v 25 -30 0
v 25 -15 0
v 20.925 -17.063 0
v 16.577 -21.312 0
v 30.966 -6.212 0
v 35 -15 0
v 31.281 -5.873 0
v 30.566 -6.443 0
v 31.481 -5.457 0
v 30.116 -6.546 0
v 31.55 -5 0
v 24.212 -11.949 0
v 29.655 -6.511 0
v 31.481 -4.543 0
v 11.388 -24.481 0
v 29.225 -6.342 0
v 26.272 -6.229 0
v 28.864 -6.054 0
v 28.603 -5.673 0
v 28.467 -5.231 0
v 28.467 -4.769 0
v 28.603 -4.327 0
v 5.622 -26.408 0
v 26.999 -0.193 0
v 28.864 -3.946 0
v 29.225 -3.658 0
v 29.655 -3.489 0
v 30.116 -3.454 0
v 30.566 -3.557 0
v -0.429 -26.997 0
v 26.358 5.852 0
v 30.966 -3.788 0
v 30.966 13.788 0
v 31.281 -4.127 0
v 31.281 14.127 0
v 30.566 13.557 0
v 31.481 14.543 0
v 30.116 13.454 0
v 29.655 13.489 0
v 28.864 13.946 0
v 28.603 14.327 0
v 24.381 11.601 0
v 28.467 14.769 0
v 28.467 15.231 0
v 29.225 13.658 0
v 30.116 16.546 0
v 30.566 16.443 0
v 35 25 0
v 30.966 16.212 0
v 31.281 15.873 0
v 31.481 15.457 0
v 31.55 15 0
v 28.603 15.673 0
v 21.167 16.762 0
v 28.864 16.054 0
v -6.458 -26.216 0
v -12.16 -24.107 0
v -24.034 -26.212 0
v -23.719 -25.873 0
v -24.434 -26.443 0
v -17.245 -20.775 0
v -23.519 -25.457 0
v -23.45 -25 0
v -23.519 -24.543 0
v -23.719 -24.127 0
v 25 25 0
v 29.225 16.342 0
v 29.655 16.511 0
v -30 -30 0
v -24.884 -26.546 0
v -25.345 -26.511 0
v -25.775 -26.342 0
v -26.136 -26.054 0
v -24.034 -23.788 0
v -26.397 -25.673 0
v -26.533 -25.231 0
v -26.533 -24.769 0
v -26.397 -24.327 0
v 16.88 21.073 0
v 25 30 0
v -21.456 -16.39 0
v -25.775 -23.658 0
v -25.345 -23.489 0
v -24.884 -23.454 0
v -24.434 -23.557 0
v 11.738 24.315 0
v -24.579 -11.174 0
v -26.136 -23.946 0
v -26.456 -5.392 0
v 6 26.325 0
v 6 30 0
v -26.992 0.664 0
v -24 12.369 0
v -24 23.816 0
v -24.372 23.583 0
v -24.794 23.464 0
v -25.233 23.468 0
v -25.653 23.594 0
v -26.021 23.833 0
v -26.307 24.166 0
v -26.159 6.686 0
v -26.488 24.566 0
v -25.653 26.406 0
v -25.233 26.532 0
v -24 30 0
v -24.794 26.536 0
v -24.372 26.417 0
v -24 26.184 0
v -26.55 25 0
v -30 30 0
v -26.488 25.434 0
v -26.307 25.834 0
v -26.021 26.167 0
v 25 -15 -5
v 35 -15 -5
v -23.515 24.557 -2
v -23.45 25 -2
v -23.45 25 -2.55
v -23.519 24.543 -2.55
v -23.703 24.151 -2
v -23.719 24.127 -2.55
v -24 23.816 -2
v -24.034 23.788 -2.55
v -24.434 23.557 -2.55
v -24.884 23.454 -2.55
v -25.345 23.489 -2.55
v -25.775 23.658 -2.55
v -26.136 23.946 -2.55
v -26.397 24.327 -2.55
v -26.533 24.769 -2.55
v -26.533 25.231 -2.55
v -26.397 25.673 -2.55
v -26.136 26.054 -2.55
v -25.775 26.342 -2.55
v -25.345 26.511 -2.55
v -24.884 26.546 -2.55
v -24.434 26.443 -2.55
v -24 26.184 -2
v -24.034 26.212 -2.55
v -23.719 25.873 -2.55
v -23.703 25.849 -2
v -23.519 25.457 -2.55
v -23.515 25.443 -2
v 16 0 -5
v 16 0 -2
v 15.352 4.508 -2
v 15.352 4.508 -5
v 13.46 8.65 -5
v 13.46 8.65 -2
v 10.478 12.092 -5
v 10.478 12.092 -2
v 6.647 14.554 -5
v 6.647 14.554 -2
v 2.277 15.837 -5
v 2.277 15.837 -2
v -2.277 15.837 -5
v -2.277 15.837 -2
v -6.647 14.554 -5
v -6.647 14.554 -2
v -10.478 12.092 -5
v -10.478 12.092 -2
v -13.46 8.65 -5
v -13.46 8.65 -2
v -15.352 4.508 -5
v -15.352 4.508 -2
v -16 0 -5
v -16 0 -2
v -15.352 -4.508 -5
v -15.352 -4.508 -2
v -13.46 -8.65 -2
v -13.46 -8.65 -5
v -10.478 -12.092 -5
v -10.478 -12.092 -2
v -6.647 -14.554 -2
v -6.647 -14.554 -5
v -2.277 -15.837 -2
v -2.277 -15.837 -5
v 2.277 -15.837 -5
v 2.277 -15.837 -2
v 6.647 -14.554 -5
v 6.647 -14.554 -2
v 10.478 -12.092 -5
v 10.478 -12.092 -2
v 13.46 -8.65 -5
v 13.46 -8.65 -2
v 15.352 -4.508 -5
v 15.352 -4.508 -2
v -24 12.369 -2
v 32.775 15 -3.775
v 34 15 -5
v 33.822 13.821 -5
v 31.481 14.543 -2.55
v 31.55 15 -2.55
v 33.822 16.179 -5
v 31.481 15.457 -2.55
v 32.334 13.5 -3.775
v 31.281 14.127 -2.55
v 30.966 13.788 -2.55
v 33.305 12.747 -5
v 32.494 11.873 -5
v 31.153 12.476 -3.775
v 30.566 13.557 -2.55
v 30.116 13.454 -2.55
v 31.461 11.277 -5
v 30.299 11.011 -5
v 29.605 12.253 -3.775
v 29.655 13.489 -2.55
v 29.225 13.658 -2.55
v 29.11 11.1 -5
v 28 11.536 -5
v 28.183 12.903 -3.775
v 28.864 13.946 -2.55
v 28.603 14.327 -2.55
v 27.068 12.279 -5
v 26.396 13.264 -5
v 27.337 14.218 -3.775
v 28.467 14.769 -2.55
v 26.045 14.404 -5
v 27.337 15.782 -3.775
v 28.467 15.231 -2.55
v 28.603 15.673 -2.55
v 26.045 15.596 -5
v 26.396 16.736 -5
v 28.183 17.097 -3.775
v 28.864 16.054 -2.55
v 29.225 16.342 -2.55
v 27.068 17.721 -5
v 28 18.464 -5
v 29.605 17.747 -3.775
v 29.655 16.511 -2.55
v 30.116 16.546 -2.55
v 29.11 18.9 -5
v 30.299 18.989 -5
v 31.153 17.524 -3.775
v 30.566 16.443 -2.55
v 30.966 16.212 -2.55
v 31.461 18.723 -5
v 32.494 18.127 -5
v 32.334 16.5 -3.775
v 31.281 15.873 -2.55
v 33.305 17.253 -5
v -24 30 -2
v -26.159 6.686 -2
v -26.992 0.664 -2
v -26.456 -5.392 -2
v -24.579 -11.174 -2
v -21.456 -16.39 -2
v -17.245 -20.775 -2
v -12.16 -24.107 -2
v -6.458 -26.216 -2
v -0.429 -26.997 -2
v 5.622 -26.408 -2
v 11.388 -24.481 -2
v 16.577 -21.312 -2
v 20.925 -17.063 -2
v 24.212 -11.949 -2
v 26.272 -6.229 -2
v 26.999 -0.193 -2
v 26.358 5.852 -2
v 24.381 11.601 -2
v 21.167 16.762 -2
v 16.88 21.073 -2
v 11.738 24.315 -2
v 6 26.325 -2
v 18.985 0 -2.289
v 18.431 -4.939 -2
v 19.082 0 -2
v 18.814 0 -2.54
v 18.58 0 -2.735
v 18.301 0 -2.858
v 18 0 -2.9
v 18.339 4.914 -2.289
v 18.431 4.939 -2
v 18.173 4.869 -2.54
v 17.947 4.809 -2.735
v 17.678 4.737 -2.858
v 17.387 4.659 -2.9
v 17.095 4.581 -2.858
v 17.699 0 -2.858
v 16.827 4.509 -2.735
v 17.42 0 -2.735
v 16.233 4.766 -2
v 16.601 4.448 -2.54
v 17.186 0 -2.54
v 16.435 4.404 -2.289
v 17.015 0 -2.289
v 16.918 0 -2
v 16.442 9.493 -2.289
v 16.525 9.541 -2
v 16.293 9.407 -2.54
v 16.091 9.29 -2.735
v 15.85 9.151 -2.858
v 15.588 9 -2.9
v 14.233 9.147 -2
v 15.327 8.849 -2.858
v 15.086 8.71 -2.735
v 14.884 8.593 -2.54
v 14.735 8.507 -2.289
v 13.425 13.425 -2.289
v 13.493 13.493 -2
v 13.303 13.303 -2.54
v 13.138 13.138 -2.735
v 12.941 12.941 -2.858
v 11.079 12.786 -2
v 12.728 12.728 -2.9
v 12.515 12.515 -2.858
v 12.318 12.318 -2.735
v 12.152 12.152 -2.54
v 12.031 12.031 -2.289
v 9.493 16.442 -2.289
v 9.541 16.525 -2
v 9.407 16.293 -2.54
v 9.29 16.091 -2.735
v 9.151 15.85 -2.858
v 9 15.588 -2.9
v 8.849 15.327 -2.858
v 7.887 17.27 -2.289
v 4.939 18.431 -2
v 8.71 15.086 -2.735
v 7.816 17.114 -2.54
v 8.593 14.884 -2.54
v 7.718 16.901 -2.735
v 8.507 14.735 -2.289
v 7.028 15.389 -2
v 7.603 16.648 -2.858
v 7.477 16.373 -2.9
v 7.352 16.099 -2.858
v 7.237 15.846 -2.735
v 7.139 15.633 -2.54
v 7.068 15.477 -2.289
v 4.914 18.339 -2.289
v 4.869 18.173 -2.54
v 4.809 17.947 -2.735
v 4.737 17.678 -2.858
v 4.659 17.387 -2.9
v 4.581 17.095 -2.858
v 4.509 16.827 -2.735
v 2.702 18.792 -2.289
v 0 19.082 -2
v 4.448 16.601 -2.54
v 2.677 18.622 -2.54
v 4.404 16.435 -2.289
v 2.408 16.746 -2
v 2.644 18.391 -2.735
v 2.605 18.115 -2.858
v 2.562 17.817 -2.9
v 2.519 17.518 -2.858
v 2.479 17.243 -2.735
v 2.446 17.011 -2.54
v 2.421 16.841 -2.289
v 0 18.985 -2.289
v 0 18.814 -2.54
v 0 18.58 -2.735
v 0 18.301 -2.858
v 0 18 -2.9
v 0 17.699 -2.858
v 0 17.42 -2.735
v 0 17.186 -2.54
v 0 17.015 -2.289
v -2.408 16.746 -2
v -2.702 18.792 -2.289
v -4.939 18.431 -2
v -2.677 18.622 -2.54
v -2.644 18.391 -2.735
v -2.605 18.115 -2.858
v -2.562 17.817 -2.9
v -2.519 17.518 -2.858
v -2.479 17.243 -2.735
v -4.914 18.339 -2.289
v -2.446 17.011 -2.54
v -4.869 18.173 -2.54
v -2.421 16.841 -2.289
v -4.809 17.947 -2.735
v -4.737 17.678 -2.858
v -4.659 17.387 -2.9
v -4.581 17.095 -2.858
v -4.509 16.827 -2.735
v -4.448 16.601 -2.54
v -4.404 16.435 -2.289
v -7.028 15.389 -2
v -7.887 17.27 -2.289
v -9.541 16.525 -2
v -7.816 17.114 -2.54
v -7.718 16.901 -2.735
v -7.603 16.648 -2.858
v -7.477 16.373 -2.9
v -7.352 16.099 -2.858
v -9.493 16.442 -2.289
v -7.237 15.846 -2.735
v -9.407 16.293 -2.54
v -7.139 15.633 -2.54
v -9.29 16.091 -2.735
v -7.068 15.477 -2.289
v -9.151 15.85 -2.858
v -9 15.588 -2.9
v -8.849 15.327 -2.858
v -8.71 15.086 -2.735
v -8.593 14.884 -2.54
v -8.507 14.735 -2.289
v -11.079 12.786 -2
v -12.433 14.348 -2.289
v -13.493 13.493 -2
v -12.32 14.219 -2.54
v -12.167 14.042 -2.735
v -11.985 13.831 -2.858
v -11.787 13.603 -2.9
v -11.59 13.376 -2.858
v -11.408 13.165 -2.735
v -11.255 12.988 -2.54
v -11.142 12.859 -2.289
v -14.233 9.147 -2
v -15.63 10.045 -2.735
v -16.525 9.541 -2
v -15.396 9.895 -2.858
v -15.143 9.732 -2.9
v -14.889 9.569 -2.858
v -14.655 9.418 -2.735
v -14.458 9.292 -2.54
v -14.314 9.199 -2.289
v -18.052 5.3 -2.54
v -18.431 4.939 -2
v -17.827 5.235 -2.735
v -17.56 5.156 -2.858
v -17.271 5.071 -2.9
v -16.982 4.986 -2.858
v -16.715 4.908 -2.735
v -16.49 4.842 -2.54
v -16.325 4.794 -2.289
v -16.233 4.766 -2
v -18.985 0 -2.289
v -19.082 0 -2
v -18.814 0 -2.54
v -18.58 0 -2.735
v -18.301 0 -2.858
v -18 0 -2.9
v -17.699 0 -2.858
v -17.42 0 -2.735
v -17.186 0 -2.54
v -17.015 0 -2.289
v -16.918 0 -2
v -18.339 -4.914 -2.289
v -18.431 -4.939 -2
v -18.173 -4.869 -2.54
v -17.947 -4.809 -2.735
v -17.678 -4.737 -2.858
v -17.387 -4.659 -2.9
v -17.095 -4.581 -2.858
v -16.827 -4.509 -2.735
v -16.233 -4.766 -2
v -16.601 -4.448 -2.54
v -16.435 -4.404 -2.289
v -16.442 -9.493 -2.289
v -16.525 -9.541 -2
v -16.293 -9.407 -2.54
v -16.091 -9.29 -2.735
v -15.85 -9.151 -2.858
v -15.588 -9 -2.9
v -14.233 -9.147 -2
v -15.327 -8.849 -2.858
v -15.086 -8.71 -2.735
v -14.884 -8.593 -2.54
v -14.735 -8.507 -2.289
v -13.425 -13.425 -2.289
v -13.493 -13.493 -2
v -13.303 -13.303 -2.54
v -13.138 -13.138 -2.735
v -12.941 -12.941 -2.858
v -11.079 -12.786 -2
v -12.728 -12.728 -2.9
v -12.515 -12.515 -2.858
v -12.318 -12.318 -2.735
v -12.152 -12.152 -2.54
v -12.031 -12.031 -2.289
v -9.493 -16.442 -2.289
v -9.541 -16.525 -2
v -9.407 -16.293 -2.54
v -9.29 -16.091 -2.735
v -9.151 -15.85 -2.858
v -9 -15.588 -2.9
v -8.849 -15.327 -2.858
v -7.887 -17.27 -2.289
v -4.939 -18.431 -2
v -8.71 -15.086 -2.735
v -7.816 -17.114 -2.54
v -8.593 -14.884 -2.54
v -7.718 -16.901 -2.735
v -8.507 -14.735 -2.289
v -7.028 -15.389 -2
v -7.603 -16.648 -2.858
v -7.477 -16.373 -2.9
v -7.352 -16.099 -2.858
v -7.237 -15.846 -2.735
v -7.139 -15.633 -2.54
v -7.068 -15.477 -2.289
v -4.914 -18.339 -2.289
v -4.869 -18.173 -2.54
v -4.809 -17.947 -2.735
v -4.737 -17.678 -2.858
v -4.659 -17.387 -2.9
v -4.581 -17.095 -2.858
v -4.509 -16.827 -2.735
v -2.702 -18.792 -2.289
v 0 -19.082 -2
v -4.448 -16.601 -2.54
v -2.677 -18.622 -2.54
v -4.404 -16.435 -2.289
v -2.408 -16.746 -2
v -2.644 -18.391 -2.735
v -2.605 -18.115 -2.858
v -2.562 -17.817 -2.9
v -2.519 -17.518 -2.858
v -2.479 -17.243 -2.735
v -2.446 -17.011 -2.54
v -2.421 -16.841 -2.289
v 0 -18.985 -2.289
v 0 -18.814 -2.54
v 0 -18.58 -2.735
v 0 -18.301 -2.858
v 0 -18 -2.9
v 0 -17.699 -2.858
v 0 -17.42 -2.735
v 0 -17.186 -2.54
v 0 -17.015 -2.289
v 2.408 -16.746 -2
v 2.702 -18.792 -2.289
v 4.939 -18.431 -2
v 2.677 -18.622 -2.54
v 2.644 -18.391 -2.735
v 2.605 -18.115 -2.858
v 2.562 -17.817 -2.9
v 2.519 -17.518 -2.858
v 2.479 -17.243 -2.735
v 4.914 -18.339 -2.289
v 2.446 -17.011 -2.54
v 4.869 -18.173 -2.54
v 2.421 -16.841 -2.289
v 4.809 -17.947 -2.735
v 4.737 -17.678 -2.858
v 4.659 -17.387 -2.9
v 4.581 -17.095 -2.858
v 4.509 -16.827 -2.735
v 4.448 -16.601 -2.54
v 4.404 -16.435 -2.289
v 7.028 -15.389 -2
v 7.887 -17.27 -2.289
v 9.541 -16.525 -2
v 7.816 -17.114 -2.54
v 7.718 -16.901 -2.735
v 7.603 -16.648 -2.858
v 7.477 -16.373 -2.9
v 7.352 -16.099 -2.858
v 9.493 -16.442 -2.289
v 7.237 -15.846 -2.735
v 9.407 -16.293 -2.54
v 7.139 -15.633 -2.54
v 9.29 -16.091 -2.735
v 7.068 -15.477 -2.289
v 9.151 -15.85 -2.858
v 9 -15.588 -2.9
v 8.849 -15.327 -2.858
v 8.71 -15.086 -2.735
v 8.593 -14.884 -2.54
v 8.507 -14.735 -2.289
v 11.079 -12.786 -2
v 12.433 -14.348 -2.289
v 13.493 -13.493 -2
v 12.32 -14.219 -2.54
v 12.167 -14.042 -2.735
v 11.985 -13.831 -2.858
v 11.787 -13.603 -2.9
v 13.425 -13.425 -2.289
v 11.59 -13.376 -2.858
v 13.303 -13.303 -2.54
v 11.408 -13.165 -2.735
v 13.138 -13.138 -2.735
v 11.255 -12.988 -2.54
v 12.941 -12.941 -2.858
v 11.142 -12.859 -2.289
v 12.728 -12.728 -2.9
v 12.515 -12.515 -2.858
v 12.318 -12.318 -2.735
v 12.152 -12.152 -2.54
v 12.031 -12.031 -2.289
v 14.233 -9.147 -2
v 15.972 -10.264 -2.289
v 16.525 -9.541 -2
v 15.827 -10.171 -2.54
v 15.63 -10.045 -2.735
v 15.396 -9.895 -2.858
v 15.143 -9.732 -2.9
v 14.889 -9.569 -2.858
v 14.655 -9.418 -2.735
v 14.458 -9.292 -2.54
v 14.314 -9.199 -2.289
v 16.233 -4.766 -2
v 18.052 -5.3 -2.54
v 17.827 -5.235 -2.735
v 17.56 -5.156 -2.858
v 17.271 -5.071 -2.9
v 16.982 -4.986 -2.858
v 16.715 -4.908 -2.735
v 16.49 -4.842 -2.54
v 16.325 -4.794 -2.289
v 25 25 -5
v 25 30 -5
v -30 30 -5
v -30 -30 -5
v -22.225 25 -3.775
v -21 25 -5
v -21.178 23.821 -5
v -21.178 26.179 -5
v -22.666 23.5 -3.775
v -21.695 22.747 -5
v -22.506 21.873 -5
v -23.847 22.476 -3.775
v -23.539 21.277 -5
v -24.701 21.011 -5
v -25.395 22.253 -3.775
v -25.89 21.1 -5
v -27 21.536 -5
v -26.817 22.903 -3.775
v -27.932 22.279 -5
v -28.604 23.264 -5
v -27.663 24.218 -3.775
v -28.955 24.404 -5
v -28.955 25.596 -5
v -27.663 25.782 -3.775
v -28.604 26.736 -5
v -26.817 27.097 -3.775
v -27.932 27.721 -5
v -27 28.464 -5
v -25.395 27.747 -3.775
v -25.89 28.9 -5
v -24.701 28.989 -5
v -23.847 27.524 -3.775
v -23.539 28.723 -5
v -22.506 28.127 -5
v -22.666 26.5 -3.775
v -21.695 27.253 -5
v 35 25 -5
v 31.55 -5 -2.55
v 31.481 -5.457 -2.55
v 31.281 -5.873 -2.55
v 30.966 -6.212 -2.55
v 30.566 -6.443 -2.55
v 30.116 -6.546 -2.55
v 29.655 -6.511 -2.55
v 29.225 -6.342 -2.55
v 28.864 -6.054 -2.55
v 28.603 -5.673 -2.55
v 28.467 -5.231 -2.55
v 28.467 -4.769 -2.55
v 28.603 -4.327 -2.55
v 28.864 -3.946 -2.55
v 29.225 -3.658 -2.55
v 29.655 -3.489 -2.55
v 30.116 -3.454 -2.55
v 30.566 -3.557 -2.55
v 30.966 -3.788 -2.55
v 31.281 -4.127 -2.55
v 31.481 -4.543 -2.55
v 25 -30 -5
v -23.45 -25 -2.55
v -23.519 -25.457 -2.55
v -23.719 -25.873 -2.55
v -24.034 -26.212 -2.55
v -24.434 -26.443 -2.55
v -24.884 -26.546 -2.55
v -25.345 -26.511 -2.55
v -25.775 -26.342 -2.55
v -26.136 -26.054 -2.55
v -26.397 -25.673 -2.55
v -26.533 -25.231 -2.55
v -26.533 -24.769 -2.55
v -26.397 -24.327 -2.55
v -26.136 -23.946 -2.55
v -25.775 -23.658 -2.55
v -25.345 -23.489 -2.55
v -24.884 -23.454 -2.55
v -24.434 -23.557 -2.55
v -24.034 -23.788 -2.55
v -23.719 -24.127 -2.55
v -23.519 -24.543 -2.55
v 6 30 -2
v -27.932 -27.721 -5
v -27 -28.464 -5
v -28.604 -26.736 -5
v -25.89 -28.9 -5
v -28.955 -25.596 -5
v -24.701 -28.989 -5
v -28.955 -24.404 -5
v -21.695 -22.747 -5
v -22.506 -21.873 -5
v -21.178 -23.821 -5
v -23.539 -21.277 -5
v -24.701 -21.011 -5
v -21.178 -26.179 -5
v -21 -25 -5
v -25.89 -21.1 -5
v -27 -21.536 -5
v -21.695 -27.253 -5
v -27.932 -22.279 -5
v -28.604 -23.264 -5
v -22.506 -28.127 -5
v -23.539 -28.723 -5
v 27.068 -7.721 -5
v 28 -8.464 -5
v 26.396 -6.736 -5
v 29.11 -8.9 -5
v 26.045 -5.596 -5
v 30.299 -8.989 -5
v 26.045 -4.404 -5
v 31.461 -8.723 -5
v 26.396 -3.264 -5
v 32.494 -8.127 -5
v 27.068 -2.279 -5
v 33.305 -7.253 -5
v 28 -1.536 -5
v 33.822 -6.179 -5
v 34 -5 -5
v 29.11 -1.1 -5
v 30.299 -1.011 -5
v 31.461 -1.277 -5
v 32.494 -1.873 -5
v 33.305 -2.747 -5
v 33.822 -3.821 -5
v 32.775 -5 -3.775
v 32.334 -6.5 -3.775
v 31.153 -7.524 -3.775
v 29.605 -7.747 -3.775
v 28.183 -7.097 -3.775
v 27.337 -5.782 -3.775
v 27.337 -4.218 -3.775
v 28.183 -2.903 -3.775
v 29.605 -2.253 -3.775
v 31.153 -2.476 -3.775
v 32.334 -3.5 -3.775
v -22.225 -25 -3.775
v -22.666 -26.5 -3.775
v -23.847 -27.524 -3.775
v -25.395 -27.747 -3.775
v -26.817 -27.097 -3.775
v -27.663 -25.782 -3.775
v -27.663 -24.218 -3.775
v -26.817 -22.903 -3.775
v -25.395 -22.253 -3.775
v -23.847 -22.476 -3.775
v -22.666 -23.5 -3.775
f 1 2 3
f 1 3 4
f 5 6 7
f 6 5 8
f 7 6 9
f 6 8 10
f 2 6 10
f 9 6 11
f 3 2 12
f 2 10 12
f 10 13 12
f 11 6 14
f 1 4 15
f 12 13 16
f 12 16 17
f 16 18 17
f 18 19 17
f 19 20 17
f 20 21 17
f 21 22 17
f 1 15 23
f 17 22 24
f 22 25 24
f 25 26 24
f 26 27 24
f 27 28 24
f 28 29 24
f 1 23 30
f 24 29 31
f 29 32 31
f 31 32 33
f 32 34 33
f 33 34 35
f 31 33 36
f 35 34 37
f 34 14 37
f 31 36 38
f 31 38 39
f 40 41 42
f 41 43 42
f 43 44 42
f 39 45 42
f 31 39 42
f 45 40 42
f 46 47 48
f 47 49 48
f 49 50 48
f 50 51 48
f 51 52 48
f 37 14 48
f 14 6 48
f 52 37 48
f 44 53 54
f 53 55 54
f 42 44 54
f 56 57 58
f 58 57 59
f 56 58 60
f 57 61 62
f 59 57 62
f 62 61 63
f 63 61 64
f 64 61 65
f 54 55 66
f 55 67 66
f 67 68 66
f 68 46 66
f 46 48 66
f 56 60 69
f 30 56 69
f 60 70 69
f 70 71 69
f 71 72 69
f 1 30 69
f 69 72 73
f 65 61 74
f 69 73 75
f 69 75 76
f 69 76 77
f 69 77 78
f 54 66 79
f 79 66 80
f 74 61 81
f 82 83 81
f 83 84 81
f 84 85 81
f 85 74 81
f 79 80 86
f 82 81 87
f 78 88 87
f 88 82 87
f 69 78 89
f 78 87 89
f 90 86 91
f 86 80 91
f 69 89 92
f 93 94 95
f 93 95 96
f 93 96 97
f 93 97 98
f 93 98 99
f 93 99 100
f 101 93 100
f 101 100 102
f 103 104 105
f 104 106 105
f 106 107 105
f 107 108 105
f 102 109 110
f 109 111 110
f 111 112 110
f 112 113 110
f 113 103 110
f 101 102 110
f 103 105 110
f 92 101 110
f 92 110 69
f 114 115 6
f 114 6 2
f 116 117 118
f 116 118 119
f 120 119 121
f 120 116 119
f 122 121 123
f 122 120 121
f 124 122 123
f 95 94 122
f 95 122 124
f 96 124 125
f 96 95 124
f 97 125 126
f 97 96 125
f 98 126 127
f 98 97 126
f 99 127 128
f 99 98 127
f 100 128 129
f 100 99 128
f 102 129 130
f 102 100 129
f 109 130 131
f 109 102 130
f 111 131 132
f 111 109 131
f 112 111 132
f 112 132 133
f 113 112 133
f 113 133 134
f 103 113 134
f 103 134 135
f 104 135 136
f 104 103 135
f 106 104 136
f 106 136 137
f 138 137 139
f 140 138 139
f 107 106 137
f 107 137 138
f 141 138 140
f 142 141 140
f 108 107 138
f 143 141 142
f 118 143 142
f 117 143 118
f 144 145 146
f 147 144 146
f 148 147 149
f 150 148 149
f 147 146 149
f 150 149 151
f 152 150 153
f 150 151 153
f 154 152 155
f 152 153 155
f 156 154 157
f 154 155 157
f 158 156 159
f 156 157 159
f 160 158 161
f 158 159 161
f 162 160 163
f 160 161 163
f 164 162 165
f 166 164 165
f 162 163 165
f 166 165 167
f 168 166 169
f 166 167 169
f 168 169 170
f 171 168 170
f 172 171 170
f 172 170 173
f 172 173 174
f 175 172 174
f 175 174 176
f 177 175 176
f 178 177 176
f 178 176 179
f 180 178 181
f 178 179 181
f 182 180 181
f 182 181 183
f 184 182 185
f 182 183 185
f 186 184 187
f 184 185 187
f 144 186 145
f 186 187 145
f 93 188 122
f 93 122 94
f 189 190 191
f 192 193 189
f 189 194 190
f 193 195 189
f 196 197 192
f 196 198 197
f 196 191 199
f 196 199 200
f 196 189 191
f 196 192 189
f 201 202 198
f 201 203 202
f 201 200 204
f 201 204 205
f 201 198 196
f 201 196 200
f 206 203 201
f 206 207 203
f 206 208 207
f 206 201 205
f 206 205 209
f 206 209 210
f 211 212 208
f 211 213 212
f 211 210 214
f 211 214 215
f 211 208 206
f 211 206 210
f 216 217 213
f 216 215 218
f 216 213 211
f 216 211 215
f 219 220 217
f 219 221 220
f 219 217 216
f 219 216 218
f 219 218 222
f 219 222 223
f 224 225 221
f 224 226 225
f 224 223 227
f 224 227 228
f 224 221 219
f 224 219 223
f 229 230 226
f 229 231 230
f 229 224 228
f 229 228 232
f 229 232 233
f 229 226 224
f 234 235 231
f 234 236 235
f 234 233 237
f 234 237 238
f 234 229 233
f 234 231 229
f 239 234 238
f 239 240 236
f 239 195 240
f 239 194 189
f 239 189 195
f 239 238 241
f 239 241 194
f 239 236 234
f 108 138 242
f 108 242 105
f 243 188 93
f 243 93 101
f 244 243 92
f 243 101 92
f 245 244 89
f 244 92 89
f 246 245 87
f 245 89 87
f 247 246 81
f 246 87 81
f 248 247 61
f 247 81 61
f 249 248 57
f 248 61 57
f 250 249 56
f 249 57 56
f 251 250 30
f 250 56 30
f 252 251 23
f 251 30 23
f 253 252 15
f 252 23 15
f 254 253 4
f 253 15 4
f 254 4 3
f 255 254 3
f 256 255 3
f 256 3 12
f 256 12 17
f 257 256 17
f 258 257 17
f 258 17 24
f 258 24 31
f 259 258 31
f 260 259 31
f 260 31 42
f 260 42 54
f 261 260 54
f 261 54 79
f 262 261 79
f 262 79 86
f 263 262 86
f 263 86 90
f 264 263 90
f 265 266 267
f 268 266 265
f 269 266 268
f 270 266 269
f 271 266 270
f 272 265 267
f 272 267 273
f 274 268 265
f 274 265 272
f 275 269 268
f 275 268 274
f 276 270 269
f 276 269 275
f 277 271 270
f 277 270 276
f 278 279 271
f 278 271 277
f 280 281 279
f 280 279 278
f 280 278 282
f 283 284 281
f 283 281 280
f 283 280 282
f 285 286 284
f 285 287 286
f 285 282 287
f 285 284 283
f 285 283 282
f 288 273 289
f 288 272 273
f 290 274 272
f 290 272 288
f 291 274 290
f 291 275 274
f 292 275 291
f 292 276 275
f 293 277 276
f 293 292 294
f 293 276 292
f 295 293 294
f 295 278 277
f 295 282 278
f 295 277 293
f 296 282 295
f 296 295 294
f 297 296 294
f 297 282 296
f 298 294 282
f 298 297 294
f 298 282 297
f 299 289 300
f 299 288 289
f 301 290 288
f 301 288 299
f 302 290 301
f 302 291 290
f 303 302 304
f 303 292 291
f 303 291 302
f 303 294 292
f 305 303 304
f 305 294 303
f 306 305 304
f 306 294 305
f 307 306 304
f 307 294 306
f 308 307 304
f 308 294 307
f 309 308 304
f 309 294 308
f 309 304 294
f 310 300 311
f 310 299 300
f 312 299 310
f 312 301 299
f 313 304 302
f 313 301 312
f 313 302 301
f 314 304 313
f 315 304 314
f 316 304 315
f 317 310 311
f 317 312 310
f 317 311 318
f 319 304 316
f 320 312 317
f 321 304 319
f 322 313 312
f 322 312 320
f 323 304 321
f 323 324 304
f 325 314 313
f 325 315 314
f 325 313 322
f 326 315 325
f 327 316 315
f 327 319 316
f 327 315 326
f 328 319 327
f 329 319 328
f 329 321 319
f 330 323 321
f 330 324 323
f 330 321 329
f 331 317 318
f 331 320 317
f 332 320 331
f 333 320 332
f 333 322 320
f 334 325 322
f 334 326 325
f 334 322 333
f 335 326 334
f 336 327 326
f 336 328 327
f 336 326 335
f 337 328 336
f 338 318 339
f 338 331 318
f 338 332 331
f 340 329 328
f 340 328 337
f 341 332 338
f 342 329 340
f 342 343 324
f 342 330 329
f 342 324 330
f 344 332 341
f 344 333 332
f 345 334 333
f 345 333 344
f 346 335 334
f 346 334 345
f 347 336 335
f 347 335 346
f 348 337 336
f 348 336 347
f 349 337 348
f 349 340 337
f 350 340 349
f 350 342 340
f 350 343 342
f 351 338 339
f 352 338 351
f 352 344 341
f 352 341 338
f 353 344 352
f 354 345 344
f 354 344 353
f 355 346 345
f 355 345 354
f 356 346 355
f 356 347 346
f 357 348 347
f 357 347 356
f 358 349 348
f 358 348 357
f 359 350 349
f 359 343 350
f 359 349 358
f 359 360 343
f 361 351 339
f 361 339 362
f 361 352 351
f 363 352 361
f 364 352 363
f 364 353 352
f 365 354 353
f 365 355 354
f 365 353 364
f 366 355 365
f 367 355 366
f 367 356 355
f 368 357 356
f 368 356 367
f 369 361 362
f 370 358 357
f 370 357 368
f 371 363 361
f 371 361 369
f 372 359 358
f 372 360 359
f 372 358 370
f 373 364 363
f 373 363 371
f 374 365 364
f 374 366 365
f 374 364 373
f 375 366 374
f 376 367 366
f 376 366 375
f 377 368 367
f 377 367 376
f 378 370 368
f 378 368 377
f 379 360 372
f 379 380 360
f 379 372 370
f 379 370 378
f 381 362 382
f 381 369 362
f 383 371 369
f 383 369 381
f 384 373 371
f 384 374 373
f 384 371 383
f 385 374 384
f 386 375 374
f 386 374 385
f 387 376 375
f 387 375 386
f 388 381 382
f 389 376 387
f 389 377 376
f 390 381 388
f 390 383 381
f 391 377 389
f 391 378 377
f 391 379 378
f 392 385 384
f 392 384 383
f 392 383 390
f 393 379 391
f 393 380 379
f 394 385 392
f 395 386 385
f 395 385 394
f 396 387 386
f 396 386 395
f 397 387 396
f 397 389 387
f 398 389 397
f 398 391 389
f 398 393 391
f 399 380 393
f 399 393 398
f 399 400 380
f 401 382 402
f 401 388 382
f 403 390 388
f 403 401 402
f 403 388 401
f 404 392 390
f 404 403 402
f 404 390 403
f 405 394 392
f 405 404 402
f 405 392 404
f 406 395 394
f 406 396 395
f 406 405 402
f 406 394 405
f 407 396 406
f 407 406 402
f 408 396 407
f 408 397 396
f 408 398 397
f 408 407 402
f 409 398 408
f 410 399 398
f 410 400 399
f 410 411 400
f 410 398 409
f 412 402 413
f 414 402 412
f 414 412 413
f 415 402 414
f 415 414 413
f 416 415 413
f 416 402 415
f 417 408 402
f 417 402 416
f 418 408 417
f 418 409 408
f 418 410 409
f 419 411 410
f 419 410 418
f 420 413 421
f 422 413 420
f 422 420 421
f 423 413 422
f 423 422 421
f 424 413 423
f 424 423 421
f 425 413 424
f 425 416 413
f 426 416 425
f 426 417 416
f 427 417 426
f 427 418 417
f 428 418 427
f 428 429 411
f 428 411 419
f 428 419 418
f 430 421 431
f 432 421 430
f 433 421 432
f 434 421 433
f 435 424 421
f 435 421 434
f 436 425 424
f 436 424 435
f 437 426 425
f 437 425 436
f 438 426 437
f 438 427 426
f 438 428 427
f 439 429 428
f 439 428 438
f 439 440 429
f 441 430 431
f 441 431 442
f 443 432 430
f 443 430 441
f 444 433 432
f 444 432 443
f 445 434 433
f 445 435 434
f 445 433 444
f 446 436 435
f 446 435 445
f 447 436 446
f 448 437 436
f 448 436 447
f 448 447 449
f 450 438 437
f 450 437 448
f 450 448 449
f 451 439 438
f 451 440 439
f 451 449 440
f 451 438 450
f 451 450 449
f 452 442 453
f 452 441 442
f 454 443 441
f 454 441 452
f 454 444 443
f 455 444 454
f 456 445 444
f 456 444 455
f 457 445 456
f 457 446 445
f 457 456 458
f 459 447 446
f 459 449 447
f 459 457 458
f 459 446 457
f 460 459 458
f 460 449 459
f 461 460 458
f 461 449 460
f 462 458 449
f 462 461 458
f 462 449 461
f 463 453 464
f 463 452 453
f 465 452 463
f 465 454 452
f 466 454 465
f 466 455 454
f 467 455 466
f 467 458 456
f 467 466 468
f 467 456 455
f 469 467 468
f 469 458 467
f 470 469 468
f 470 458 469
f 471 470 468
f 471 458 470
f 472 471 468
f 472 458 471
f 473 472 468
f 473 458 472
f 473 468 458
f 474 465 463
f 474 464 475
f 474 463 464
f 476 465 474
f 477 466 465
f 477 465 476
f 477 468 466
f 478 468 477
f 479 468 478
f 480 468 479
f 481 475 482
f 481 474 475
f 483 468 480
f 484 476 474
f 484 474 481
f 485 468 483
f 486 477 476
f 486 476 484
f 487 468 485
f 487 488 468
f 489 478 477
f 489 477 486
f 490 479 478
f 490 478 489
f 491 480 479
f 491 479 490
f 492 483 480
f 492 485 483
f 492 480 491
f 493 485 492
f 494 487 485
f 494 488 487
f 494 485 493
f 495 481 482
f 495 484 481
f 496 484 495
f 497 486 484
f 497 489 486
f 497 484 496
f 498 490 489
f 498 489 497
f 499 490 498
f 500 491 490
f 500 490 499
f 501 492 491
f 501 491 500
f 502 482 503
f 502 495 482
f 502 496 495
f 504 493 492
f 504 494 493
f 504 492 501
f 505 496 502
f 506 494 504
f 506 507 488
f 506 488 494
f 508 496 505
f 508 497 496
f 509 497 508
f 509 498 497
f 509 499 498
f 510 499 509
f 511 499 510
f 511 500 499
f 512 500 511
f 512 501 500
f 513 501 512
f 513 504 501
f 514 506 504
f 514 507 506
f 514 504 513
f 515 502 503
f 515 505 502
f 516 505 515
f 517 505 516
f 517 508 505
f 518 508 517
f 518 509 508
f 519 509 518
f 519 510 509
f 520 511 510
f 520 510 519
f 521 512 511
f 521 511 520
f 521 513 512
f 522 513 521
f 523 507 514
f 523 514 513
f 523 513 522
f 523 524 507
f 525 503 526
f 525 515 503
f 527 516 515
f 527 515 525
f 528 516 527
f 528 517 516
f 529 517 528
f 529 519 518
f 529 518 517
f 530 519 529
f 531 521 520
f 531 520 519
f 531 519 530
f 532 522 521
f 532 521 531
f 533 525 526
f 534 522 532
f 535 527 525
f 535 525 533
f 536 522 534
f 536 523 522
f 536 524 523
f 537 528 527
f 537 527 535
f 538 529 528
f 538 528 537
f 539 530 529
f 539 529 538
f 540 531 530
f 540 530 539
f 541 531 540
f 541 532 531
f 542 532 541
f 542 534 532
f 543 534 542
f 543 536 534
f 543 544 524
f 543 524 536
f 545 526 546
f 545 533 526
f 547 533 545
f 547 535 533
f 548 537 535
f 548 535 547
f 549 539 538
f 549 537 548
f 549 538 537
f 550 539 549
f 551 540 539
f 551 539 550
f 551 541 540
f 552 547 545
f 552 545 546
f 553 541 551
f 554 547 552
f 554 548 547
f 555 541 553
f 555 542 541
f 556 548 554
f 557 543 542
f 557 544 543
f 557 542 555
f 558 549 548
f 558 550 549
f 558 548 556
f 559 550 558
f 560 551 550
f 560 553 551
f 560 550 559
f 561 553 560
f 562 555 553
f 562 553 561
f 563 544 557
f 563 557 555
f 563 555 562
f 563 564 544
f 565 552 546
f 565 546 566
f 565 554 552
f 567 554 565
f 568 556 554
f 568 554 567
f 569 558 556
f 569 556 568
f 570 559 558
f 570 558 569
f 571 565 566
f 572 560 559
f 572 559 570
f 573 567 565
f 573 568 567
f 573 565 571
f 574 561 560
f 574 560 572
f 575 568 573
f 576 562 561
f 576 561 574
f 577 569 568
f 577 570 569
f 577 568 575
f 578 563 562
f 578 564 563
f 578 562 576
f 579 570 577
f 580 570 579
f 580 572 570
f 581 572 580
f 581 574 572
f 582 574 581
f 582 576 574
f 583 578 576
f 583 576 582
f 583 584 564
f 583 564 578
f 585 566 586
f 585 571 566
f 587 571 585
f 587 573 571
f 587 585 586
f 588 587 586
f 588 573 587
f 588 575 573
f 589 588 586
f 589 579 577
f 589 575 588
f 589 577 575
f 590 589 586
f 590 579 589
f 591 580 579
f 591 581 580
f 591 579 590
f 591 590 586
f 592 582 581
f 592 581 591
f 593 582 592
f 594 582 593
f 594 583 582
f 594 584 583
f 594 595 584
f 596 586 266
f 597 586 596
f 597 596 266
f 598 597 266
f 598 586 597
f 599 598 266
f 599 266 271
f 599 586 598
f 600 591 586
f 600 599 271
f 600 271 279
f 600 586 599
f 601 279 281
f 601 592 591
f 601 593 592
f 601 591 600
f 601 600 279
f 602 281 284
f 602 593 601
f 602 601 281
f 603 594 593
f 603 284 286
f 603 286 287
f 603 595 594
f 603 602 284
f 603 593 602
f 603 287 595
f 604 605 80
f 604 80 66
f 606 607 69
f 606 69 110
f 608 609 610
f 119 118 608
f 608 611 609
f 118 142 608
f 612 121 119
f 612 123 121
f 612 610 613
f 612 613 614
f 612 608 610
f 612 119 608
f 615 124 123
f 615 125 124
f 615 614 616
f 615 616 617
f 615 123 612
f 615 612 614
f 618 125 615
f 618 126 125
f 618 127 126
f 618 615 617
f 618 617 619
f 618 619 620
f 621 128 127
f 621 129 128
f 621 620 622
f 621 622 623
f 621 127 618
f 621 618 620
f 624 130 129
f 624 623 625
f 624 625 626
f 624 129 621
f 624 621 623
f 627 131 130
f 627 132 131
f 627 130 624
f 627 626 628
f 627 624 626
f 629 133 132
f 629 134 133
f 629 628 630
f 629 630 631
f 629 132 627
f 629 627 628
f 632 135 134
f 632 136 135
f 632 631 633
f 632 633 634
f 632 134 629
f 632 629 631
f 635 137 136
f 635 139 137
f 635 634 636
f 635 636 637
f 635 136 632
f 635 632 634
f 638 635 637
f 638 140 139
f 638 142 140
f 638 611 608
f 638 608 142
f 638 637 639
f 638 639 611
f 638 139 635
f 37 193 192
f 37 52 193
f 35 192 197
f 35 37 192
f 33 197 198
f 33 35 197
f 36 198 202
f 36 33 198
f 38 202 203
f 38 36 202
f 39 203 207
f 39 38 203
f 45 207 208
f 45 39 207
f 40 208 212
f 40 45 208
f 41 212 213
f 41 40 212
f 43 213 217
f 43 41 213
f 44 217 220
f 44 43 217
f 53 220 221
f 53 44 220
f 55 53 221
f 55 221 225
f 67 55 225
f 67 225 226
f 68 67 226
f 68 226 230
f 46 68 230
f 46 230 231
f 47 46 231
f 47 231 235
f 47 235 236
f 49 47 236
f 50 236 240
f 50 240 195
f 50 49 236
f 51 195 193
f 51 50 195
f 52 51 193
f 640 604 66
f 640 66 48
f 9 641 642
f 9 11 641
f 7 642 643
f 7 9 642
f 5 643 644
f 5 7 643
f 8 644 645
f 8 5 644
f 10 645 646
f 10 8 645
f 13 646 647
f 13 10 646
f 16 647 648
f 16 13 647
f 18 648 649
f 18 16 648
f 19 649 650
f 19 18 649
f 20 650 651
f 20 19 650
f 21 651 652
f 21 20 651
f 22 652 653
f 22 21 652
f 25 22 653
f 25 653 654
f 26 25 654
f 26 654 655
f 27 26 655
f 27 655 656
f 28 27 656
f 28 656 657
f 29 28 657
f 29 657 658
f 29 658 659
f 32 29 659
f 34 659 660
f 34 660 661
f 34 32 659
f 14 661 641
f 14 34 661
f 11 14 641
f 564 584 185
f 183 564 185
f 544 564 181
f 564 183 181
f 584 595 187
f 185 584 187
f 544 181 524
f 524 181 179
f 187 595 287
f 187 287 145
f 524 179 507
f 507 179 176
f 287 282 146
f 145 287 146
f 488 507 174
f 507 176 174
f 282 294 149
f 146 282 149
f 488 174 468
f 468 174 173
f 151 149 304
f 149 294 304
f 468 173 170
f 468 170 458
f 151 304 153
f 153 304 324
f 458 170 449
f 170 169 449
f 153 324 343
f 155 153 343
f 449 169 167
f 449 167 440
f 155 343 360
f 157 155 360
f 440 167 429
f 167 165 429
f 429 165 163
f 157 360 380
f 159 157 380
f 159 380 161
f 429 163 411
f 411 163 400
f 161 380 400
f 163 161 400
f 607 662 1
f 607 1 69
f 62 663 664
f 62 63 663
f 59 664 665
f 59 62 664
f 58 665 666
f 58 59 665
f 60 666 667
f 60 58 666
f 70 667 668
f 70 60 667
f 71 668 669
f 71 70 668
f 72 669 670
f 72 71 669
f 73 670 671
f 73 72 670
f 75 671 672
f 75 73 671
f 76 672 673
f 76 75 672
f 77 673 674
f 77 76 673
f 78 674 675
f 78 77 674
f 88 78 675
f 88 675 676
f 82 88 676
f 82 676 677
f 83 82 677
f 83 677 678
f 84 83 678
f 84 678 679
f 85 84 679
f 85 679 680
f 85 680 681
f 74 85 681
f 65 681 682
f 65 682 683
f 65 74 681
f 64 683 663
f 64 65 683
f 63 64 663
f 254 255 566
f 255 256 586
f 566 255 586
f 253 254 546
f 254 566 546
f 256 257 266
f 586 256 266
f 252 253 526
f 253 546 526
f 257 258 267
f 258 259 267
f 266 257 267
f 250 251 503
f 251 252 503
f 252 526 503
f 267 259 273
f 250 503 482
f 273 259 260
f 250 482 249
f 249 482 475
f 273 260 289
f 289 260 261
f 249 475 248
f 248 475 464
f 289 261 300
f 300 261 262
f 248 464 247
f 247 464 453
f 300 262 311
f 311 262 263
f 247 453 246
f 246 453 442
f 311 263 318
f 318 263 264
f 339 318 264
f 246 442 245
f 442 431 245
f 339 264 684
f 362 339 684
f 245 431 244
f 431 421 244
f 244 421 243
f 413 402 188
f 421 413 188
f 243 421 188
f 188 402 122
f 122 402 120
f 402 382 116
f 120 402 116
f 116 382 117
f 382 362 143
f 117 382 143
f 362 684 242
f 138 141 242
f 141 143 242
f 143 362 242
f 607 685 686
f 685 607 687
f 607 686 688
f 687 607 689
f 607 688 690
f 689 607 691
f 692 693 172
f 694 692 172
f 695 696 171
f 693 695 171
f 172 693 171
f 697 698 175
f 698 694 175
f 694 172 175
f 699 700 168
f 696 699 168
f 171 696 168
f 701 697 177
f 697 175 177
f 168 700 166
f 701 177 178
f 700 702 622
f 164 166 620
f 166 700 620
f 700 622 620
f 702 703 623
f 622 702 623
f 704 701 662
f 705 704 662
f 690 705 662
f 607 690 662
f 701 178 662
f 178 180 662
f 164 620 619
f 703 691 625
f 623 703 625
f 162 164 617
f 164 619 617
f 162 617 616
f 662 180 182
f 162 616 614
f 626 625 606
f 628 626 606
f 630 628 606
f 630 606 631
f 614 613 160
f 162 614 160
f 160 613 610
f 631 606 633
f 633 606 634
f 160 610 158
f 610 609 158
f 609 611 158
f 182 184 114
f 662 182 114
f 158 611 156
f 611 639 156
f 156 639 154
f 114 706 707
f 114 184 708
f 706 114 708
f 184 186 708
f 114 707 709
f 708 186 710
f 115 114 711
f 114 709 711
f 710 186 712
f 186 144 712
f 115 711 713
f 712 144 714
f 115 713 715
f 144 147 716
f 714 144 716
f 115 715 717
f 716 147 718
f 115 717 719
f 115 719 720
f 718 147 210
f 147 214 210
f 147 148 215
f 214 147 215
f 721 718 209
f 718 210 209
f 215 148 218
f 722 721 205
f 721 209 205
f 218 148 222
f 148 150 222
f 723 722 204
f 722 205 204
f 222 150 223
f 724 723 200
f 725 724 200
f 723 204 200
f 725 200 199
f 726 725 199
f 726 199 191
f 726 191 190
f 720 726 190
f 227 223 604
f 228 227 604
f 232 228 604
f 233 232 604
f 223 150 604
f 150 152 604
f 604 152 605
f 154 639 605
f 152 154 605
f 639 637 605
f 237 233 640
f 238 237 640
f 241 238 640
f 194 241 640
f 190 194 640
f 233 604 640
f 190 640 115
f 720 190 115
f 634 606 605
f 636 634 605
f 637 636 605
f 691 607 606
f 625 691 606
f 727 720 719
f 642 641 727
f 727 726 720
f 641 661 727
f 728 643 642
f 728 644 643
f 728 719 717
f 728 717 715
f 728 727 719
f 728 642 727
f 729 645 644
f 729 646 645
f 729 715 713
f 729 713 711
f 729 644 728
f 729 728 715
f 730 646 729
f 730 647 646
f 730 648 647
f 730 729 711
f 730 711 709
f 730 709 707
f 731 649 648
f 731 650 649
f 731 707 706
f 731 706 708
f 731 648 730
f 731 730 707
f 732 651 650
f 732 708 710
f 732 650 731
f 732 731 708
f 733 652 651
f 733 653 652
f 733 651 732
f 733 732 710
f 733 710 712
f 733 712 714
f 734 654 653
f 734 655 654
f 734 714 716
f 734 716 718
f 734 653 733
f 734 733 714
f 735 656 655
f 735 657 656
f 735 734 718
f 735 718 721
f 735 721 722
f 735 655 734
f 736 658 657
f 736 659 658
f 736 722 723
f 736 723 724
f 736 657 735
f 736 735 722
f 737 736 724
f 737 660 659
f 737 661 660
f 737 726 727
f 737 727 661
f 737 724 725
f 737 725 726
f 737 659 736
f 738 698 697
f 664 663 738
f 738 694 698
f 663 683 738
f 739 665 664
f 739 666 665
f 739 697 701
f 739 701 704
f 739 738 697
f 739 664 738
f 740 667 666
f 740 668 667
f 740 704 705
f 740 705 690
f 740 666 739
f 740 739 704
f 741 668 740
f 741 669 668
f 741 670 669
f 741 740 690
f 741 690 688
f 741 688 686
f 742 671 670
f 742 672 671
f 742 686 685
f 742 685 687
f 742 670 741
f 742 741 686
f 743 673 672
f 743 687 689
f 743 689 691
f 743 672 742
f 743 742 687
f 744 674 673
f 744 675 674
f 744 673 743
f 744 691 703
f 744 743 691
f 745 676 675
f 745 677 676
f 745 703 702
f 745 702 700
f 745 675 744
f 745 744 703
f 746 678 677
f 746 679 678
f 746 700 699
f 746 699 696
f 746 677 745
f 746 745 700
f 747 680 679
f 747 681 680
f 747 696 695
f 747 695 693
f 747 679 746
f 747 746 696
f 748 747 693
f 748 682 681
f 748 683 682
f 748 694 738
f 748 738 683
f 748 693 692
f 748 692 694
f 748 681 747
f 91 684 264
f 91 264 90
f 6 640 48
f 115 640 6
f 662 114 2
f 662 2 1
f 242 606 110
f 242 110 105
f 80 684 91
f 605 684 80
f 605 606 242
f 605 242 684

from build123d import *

# Parameters (mm, degrees)
SKETCH007_W      = 229.65287
SKETCH007_H      = 196.321915
POCKET003_DEPTH  = 10
HOLE_D           = 3.1
HOLE_DEPTH       = 25
HOLE_CSINK_D     = 8
HOLE_CSINK_ANGLE = 90
SKETCH009_W      = 30
SKETCH009_H      = 2
POCKET004_DEPTH  = 30


with BuildPart() as bearing_outside:
    # Sketch003 → Revolution001 (revolve)
    with BuildSketch(Plane.XZ):
        with BuildLine():
            Line((27, 2), (27, 0))
            Line((27, 0), (50, 0))
            Line((50, 0), (50, 5))
            Line((50, 5), (16, 5))
            Line((16, 5), (16, 2))
            Line((16, 2), (16.918335, 2))
            ThreePointArc((19.081665, 2), (18, 2.9), (16.918335, 2))
            Line((19.081665, 2), (20, 2))
            Line((20, 2), (27, 2))
        make_face()
    revolve(axis=Axis((0, 0, 0), (0, 0, 1)))

    # Sketch007 (on Face6 of Revolution001) → Pocket003 (cut)
    with BuildSketch(Plane(origin=(0, 0, 5), x_dir=(-1, 0, 0), z_dir=(0, 0, 1))):
        with Locations((6.373165, -15.747734)):
            Rectangle(SKETCH007_W, SKETCH007_H)
        Polygon((30, 30), (30, -30), (-25, -30), (-25, -25), (-35, -25), (-35, 15), (-25, 15), (-25, 30), align=None, mode=Mode.SUBTRACT)
    extrude(amount=-POCKET003_DEPTH, mode=Mode.SUBTRACT)

    # Hole
    with Locations(Plane(origin=(0, 0, 5), x_dir=(-1, 0, 0), z_dir=(0, 0, 1))):
        with Locations((25, 25), (25, -25), (-30, -15), (-30, 5)):
            CounterSinkHole(HOLE_D / 2, HOLE_CSINK_D / 2, depth=HOLE_DEPTH, counter_sink_angle=HOLE_CSINK_ANGLE)

    # Sketch009 (on Face13 of Hole) → Pocket004 (cut)
    with BuildSketch(Plane(origin=(0, 30, 0), x_dir=(1, 0, 0), z_dir=(0, 1, 0))):
        with Locations((-9, -1)):
            Rectangle(SKETCH009_W, SKETCH009_H)
    extrude(amount=-POCKET004_DEPTH, mode=Mode.SUBTRACT)


with BuildPart() as part_mirroring:
    # Part__Mirroring: instance of bearing-outside
    add(bearing_outside.part.mirror(Plane(origin=(0, 0, 0), x_dir=(0, 1, 0), z_dir=(0, 0, 1))))


solid = part_mirroring.part
